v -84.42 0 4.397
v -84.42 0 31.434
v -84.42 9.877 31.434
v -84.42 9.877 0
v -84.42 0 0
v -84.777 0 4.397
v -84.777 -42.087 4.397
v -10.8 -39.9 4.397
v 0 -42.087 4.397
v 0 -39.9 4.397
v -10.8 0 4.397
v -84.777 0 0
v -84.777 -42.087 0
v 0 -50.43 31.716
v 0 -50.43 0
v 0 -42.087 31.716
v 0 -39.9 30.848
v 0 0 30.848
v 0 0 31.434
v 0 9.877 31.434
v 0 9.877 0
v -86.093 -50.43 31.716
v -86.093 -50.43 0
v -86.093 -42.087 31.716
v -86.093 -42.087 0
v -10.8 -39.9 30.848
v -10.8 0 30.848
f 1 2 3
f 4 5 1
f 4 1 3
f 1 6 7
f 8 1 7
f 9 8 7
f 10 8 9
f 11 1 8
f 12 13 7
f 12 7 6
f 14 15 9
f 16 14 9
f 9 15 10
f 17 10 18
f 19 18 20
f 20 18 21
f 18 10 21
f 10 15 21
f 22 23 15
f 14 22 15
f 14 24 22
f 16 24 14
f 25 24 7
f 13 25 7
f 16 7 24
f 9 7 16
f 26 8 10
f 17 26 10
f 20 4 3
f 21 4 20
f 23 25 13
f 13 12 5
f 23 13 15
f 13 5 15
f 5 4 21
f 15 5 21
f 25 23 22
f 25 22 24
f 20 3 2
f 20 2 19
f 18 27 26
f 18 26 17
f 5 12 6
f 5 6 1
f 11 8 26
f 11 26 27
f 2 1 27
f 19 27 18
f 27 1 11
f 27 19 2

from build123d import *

# Parameters (mm, degrees)
F0_W     = 84.7769677639
F0_H     = 43.2662777603
F1_DEPTH = 4.3966565281
F2_W     = 84.4204500318
F2_H     = 9.8768174648
F3_DEPTH = 31.4335487783
F4_W     = 86.0934257507
F4_H     = 8.3434134722
F5_DEPTH = 31.7156463861
F6_W     = 10.8002573252
F6_H     = 39.9001836777
F7_DEPTH = 30.848281458


with BuildPart() as f1:
    # F0 (on Top) → F1 (new body)
    with BuildSketch(Plane.XY):
        with Locations((-42.388483882, -21.6331388801)):
            Rectangle(F0_W, F0_H)
    extrude(amount=F1_DEPTH)

    # F2 (on Top) → F3 (join)
    with BuildSketch(Plane.XY):
        with Locations((-42.2102250159, 4.9384087324)):
            Rectangle(F2_W, F2_H)
    extrude(amount=F3_DEPTH)

    # F4 (on Top) → F5 (join)
    with BuildSketch(Plane.XY):
        with Locations((-43.0467128754, -46.2585315108)):
            Rectangle(F4_W, F4_H)
    extrude(amount=F5_DEPTH)

    # F6 (on Top) → F7 (join)
    with BuildSketch(Plane.XY):
        with Locations((-5.4001286626, -19.9500918388)):
            Rectangle(F6_W, F6_H)
    extrude(amount=F7_DEPTH)


solid = f1.part
